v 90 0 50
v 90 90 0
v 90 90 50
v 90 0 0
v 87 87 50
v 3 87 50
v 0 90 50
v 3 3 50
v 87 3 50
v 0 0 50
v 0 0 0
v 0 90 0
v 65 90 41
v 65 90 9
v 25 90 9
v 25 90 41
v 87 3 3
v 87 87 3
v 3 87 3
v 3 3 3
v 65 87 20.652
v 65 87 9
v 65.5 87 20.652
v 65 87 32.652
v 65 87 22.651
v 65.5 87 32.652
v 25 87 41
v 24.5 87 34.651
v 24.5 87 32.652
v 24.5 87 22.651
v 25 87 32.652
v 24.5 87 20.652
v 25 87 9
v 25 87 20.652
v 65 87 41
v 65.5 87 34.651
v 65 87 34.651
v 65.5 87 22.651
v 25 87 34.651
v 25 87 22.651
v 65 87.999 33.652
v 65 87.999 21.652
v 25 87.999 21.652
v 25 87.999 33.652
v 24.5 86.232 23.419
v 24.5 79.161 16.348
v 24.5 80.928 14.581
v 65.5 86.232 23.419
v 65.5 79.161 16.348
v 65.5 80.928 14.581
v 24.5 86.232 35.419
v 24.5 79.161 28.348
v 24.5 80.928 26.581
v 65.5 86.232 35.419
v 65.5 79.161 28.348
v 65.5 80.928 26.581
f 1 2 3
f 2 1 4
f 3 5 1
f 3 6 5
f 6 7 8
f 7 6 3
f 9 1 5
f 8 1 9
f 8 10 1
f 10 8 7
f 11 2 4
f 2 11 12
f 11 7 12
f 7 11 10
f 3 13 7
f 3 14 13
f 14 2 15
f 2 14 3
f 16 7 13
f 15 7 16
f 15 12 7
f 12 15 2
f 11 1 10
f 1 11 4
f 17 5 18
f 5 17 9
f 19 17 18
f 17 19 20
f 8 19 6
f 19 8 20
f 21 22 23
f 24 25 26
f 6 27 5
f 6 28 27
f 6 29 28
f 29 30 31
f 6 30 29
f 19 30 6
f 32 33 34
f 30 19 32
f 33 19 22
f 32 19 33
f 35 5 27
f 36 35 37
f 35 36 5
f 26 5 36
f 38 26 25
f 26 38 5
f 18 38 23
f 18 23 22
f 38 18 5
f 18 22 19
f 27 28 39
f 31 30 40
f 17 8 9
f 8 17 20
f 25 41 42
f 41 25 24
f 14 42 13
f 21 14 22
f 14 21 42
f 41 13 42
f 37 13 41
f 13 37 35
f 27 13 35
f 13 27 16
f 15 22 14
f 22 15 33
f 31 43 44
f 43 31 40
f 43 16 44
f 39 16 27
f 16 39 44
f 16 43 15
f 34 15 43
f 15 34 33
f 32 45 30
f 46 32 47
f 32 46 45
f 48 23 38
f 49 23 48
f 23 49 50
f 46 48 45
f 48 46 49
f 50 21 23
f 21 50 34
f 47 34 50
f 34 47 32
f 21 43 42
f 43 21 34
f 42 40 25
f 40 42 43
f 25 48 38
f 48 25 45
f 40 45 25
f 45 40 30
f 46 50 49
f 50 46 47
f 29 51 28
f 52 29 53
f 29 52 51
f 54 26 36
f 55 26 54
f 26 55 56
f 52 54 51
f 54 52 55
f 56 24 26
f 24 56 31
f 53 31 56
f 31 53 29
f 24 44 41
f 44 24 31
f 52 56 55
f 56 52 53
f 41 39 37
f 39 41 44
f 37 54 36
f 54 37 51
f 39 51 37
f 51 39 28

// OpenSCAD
$fn = 32;

// ----------------------------------------------------------------------
// Vent box: louvers enclosure
// ----------------------------------------------------------------------

// --- parameters (mm) ---
box_l = 90;               // box length, X
box_w = 90;               // box width, Y
box_h = 50;               // box height, Z
wall_t = 3;               // shell wall thickness
win_l = 40;               // vent window width, X
win_h = 32;               // vent window height, Z
slat_t = 2.5;             // louver slat thickness
slat_d = 10;              // louver slat depth
slat_a = 45;              // louver slat angle, degrees
slat_pitch = 12;          // louver pitch
slat_yc = 83.58;          // slat centreline Y

win_z0 = (box_h - win_h) / 2;  // window lower edge Z
n_slats = 2;  // louver count
slat_z0 = win_z0 + (win_h - (n_slats - 1) * slat_pitch) / 2;

difference() {
  union() {
    difference() {
      cube([box_l, box_w, box_h]);
  translate([wall_t, wall_t, wall_t])
    cube([box_l - 2 * wall_t, box_w - 2 * wall_t, box_h]);
  translate([(box_l - win_l) / 2, box_w - wall_t - 1, win_z0])
    cube([win_l, wall_t + 2, win_h]);
    }
    for (i = [0 : n_slats - 1])
      translate([box_l / 2, slat_yc, slat_z0 + i * slat_pitch])
        rotate([slat_a, 0, 0])
          cube([win_l + 1, slat_d, slat_t], center = true);
  }
}
